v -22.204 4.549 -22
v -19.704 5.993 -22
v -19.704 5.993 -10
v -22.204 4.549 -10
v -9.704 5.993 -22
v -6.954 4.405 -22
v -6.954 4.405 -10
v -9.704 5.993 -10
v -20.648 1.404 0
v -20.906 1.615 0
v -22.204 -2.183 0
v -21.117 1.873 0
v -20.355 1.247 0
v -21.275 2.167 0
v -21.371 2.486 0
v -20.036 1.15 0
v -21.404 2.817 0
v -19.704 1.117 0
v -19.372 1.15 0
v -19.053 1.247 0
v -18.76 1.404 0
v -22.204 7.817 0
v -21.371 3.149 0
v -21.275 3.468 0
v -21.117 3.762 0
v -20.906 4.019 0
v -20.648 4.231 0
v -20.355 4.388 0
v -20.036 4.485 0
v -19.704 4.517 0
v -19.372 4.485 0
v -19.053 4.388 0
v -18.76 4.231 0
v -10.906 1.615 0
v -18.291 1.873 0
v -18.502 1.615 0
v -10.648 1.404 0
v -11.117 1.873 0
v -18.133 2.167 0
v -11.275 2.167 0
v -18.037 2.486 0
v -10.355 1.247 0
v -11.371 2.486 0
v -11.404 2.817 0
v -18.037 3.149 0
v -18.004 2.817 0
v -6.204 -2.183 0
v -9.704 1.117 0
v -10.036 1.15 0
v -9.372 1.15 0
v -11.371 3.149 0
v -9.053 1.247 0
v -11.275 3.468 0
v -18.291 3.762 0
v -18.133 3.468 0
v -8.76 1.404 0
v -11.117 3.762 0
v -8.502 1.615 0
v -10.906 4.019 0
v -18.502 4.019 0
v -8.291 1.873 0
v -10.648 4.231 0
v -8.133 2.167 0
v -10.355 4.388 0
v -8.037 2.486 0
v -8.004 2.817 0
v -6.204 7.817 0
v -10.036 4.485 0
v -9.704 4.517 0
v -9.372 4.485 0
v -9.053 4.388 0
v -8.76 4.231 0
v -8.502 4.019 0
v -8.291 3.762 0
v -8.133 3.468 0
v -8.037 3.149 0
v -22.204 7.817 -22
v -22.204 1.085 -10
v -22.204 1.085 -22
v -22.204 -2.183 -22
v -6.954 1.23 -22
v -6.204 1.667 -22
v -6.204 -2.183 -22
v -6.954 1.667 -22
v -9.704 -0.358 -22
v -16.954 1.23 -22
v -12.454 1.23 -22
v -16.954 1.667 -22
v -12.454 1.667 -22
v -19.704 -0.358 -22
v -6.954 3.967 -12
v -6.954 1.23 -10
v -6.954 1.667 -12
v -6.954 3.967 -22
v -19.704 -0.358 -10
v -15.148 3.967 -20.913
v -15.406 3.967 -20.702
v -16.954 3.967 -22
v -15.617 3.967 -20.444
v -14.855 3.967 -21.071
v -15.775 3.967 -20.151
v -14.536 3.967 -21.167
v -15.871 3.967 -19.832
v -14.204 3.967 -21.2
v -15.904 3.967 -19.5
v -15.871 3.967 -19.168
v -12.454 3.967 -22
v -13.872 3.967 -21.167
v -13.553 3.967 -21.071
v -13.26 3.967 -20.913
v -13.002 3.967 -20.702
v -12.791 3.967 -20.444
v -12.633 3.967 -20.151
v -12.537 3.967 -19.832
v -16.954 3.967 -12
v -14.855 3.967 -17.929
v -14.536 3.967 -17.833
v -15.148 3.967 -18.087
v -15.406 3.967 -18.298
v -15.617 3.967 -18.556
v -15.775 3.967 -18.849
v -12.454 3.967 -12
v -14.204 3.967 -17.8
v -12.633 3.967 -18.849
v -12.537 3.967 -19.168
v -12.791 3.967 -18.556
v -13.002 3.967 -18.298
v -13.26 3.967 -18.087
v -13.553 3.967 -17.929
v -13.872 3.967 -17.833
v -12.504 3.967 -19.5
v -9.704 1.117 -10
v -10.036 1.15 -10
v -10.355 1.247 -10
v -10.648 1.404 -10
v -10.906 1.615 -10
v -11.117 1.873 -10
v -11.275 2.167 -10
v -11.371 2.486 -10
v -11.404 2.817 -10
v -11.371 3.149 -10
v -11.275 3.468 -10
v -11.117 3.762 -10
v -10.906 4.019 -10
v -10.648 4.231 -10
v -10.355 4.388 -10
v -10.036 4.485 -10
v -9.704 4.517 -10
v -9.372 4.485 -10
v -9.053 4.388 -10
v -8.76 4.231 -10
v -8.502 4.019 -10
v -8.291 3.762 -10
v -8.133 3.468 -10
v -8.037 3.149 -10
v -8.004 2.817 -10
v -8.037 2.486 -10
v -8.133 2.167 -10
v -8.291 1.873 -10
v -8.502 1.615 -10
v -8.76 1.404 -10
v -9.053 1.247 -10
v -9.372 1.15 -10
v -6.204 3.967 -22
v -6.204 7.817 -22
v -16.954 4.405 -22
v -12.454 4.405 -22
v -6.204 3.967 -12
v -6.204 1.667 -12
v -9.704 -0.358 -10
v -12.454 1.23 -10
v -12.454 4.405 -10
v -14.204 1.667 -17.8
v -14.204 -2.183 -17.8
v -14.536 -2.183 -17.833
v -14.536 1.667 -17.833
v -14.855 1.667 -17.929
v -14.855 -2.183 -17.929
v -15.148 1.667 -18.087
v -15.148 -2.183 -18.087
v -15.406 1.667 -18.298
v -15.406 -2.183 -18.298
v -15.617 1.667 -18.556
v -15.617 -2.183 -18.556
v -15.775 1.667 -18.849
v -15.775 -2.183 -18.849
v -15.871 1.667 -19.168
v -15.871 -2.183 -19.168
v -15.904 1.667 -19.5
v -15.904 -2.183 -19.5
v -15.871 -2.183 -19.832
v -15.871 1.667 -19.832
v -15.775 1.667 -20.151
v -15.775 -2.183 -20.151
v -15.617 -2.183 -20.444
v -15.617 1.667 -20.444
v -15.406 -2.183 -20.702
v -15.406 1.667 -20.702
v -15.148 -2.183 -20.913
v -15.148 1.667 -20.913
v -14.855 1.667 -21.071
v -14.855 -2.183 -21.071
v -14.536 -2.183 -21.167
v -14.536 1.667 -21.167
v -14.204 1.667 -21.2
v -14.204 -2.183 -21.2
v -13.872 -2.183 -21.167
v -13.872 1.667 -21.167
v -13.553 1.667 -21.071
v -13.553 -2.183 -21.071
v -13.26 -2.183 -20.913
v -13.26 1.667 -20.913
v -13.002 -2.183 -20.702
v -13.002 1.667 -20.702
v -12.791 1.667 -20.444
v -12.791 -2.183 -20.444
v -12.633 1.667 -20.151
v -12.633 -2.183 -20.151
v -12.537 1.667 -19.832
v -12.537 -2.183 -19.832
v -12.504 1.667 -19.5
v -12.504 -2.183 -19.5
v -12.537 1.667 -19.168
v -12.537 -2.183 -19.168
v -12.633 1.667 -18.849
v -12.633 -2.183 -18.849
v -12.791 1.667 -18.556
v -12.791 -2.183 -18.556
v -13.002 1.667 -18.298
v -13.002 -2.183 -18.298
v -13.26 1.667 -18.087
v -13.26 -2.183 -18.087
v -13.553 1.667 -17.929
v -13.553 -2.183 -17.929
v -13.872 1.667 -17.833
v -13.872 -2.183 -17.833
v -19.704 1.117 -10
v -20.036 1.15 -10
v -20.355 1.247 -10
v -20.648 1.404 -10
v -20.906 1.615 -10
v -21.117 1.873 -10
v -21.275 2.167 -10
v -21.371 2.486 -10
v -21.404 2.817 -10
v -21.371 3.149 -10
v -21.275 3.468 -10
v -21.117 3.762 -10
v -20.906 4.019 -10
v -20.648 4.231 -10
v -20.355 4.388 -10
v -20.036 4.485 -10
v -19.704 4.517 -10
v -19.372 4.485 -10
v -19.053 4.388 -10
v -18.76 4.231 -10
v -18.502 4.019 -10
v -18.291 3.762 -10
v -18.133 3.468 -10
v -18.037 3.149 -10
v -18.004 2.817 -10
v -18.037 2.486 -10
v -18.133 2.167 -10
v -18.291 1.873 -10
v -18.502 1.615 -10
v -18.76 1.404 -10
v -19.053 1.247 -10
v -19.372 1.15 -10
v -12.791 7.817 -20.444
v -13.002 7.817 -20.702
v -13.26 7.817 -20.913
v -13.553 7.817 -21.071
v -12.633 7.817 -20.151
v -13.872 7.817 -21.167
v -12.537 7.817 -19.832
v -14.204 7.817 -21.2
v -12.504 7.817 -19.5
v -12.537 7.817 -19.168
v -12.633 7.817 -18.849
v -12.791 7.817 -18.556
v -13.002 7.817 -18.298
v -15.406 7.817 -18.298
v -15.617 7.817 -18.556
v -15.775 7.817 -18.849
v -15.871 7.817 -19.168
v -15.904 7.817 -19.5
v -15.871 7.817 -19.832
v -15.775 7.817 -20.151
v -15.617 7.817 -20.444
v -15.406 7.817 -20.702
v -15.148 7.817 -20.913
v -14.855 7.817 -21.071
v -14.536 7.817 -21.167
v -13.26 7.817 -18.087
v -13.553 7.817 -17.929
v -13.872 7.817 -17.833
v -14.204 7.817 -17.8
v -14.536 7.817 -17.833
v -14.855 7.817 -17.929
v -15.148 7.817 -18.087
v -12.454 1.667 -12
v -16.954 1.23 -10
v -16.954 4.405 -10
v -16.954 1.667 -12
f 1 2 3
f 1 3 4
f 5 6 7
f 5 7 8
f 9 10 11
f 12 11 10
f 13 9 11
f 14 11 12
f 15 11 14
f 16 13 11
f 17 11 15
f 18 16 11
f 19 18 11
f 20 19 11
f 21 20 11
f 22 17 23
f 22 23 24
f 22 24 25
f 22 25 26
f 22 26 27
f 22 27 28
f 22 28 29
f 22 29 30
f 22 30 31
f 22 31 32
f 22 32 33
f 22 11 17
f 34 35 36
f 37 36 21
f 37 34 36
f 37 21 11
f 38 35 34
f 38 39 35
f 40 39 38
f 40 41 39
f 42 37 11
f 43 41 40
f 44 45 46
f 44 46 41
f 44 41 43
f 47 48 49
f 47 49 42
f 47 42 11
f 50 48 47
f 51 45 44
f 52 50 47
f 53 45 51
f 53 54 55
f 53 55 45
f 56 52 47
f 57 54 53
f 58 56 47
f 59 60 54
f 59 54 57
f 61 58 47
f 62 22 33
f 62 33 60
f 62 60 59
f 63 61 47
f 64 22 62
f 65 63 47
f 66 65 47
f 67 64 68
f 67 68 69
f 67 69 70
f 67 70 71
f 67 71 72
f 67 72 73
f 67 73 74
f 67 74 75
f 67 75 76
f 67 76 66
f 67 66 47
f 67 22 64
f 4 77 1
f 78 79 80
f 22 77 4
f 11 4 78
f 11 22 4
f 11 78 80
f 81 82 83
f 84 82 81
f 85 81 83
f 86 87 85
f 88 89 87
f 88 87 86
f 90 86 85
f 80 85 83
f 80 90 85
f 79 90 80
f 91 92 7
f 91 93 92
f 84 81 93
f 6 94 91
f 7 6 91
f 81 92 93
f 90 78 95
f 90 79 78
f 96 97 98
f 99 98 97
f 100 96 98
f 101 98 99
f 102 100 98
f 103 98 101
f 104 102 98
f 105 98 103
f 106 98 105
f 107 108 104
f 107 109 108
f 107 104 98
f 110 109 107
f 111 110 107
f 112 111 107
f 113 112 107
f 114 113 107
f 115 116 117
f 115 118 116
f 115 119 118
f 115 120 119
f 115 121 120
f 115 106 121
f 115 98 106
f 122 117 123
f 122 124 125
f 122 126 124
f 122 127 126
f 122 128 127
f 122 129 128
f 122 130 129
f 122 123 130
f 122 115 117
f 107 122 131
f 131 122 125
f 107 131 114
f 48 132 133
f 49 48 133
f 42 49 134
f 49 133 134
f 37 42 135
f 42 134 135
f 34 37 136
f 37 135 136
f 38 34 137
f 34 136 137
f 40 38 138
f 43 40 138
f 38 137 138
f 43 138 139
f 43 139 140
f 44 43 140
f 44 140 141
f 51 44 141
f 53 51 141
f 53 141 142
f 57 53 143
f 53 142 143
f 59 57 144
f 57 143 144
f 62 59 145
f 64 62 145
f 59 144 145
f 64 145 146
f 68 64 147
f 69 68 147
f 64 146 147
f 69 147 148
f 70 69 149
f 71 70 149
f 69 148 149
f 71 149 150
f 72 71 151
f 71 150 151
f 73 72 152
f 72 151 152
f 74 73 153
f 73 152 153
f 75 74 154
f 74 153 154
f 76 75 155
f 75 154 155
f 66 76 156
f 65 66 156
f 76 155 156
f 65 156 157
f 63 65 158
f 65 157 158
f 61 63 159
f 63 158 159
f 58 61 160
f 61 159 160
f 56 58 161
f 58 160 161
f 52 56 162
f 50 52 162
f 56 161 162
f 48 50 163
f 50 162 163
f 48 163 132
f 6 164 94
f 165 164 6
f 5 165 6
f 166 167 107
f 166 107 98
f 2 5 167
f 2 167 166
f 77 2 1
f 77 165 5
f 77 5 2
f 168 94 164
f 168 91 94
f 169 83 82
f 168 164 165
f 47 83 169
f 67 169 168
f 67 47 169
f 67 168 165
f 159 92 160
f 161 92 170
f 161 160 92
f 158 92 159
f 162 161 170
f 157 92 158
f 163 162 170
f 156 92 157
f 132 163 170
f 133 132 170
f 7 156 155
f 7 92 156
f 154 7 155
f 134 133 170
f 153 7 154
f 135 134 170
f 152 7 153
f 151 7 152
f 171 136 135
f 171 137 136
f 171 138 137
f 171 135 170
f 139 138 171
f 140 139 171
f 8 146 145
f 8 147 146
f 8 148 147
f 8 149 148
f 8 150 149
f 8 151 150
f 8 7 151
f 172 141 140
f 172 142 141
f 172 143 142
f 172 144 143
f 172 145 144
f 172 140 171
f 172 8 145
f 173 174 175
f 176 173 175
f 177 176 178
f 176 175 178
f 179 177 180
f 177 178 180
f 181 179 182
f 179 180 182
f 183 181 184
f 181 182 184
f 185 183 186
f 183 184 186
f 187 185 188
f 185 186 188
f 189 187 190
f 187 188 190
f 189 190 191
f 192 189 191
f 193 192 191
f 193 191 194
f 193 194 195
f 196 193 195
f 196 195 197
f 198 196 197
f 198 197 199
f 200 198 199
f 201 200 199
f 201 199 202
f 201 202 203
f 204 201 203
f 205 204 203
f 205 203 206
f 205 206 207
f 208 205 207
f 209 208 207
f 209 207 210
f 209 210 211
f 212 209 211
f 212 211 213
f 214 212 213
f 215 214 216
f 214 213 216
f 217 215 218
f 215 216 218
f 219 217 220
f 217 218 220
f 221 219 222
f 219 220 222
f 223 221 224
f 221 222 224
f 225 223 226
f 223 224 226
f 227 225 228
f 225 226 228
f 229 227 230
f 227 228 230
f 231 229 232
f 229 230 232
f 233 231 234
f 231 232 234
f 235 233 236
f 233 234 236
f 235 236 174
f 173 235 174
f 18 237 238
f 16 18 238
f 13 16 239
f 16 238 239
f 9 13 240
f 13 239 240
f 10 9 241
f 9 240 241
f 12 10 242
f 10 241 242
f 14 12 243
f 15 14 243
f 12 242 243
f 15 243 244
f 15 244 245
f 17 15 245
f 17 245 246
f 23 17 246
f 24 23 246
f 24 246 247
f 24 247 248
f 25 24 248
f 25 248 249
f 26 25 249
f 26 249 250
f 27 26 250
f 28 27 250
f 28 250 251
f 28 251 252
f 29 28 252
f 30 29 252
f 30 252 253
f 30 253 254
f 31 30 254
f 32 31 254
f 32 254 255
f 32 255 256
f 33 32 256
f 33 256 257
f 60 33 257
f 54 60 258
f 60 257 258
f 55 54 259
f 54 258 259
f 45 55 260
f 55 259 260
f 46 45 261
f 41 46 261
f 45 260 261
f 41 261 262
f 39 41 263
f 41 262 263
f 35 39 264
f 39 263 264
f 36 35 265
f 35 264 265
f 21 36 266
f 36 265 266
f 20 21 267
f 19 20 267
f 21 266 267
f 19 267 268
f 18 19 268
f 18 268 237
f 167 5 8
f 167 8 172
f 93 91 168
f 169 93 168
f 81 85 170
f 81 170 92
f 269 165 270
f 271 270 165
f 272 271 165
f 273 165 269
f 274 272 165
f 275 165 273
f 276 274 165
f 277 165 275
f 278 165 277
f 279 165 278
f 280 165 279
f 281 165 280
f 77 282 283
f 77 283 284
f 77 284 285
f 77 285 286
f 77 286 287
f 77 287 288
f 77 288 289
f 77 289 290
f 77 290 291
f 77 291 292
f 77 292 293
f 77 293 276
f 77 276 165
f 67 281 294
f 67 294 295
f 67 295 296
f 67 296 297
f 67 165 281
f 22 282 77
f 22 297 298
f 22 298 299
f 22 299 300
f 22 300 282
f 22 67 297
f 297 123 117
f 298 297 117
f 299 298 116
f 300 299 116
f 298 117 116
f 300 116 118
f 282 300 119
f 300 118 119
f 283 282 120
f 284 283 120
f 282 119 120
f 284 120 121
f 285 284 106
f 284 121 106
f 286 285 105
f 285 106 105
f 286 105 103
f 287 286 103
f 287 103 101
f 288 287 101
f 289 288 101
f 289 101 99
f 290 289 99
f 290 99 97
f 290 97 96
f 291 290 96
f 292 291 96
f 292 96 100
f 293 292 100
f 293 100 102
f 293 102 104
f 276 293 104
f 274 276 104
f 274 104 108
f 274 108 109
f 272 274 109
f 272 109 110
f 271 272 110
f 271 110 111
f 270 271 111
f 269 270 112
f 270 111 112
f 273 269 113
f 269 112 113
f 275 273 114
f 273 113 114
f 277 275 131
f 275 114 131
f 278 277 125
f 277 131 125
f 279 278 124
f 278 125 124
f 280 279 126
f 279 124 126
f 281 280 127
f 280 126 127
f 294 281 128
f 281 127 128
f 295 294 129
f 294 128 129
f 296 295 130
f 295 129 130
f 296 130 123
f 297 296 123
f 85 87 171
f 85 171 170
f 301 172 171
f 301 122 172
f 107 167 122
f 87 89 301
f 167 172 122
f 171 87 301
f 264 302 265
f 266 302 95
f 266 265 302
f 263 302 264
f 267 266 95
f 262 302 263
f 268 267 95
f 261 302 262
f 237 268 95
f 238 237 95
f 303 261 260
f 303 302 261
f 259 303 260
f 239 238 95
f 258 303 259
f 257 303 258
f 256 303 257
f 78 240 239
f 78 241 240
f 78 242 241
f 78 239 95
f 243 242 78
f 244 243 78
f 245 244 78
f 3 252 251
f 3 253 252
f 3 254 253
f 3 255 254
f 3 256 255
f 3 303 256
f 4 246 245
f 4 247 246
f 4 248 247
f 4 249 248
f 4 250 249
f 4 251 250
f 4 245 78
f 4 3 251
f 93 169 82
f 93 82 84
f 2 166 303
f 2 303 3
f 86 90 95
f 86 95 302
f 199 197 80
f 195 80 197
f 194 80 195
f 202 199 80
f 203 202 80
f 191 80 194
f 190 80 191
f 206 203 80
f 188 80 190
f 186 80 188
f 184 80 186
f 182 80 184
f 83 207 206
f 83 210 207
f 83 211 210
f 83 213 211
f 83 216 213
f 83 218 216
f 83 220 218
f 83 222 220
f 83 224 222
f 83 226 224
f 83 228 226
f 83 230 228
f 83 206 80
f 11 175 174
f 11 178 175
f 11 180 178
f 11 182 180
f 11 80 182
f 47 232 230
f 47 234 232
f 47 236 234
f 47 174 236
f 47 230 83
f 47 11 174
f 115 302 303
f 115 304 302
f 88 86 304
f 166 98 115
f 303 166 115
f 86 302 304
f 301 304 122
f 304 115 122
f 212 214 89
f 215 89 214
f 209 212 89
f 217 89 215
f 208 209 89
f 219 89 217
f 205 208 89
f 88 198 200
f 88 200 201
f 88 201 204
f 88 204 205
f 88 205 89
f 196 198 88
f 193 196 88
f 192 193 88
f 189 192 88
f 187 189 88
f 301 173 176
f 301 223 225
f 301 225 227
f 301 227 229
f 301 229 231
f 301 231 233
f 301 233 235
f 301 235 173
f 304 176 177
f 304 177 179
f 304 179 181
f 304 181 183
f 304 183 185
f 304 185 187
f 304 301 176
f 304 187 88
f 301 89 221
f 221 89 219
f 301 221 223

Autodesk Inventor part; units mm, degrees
ref_plane "YZ Plane" through (0, 0, 0) normal (1, 0, 0) x (0, 1, 0)
ref_plane "XZ Plane" through (0, 0, 0) normal (0, 1, 0) x (-1, 0, 0)
sketch "Sketch1" plane through (0, 0, 0) normal (0, 0, 1) x (1, 0, 0)
  circle A0 centre (-12.704, 28.2207) radius 12 projected
  circle A1 centre (-12.704, -22.5861) radius 12 projected
  line L0 (-12.704, 28.2207) -> (-12.704, -22.5861) construction
  line L1 (4.1406, 2.8173) -> (-27.9996, 2.8173) construction
  line L2 (-24.704, -73.8176) -> (-24.704, 176.1824) projected
  line L3 (-5.204, -22.5861) -> (-5.204, 28.2207) projected
  line L4 (-22.204, -2.1827) -> (-6.204, -2.1827)
  line L5 (-6.204, -2.1827) -> (-6.204, 7.8173)
  line L6 (-6.204, 7.8173) -> (-22.204, 7.8173)
  line L7 (-22.204, 7.8173) -> (-22.204, -2.1827)
  circle A2 centre (-9.704, 2.8173) radius 3.5 construction
  circle A3 centre (-19.704, 2.8173) radius 2.5 construction
  point P0 (0, 0)
  point P1 (-12.704, 2.8173)
  dimension "d1" = 10
  dimension "d2" = 5
  dimension "d3" = 7
  dimension "d4" = 5
  dimension "d5" = 10
ref_plane "Work Plane1" through (-26.704, -73.8176, -12) normal (0, 0, -1) x (0, 1, 0)
extrude "Extrusion1" add sketch "Sketch1" against normal up to surface (12 mm away) contours L7 L6 L5 L4
hole "Hole1" at (-9.704, 2.8173, 0) at (-19.704, 2.8173, 0) direction (0, 0, -1) diameter 3.4 end through all clearance for "Countersunk Head GOST 12876-67" size "M3" standard "GOST"
sketch "Sketch2" plane through (-6.204, 7.8173, -12) normal (0, 0, -1) x (-1, 0, 0)
  line L0 (0, -10) -> (0, 0) projected
  line L1 (16, 0) -> (16, -10) projected
  line L2 (0, -6.15) -> (16, -6.15)
  line L3 (16, -3.85) -> (0, -3.85)
  line L4 (-10.3445, -5) -> (21.7957, -5) construction
  line L5 (16, -10) -> (0, -10) projected
  line L6 (0, 0) -> (16, 0) projected
  point P0 (-6.204, -7.8173)
  dimension "d15" = 2.3
extrude "Extrusion2" add sketch "Sketch2" along normal blind 10 contours L0 L2 L1 L5 | L0 L6 L1 L3
sketch "Sketch3" plane through (-6.204, 7.8173, -22) normal (0, 0, -1) x (-1, 0, 0)
  line L0 (16.25, -3.4123) -> (16.25, -6.5877)
  line L1 (16.25, -6.5877) -> (13.5, -8.1754)
  line L2 (13.5, -8.1754) -> (10.75, -6.5877)
  line L3 (10.75, -6.5877) -> (10.75, -3.4123)
  line L4 (10.75, -3.4123) -> (13.5, -1.8246)
  line L5 (13.5, -1.8246) -> (16.25, -3.4123)
  line L6 (6.25, -3.4123) -> (6.25, -6.5877)
  line L7 (6.25, -6.5877) -> (3.5, -8.1754)
  line L8 (3.5, -8.1754) -> (0.75, -6.5877)
  line L9 (0.75, -6.5877) -> (0.75, -3.4123)
  line L10 (0.75, -3.4123) -> (3.5, -1.8246)
  line L11 (3.5, -1.8246) -> (6.25, -3.4123)
  line L12 (0, -6.15) -> (0, -3.85) projected
  line L13 (16, -3.85) -> (16, -6.15) projected
  point P0 (-6.204, -7.8173)
  point P1 (3.5, -5)
  point P2 (13.5, -5)
  point P3 (13.5, -5)
  point P4 (3.5, -5)
  dimension "d18" = 5.5
extrude "Extrusion3" cut sketch "Sketch3" against normal blind 12
sketch "Sketch4" plane through (-22.204, 7.8173, 0) normal (0, 1, 0) x (1, 0, 0)
  line L0 (0, 0) -> (0, 22) projected
  line L1 (16, 0) -> (0, 0) projected
  line L2 (16, 0) -> (16, 22) projected
  line L3 (0, 22) -> (16, 22) projected
  line L4 (16, 0) -> (16, 22) projected
  line L5 (16, 19.5) -> (0, 19.5)
  point P0 (22.204, 0)
  point P1 (8, 19.5)
  dimension "d21" = 2.5
hole "Hole2" at (-14.204, 7.8173, -19.5) direction (0, -1, 0) diameter 3.4 end through all clearance for "Countersunk Head GOST 12876-67" size "M3" standard "GOST"
properties part number "belt_holder"
